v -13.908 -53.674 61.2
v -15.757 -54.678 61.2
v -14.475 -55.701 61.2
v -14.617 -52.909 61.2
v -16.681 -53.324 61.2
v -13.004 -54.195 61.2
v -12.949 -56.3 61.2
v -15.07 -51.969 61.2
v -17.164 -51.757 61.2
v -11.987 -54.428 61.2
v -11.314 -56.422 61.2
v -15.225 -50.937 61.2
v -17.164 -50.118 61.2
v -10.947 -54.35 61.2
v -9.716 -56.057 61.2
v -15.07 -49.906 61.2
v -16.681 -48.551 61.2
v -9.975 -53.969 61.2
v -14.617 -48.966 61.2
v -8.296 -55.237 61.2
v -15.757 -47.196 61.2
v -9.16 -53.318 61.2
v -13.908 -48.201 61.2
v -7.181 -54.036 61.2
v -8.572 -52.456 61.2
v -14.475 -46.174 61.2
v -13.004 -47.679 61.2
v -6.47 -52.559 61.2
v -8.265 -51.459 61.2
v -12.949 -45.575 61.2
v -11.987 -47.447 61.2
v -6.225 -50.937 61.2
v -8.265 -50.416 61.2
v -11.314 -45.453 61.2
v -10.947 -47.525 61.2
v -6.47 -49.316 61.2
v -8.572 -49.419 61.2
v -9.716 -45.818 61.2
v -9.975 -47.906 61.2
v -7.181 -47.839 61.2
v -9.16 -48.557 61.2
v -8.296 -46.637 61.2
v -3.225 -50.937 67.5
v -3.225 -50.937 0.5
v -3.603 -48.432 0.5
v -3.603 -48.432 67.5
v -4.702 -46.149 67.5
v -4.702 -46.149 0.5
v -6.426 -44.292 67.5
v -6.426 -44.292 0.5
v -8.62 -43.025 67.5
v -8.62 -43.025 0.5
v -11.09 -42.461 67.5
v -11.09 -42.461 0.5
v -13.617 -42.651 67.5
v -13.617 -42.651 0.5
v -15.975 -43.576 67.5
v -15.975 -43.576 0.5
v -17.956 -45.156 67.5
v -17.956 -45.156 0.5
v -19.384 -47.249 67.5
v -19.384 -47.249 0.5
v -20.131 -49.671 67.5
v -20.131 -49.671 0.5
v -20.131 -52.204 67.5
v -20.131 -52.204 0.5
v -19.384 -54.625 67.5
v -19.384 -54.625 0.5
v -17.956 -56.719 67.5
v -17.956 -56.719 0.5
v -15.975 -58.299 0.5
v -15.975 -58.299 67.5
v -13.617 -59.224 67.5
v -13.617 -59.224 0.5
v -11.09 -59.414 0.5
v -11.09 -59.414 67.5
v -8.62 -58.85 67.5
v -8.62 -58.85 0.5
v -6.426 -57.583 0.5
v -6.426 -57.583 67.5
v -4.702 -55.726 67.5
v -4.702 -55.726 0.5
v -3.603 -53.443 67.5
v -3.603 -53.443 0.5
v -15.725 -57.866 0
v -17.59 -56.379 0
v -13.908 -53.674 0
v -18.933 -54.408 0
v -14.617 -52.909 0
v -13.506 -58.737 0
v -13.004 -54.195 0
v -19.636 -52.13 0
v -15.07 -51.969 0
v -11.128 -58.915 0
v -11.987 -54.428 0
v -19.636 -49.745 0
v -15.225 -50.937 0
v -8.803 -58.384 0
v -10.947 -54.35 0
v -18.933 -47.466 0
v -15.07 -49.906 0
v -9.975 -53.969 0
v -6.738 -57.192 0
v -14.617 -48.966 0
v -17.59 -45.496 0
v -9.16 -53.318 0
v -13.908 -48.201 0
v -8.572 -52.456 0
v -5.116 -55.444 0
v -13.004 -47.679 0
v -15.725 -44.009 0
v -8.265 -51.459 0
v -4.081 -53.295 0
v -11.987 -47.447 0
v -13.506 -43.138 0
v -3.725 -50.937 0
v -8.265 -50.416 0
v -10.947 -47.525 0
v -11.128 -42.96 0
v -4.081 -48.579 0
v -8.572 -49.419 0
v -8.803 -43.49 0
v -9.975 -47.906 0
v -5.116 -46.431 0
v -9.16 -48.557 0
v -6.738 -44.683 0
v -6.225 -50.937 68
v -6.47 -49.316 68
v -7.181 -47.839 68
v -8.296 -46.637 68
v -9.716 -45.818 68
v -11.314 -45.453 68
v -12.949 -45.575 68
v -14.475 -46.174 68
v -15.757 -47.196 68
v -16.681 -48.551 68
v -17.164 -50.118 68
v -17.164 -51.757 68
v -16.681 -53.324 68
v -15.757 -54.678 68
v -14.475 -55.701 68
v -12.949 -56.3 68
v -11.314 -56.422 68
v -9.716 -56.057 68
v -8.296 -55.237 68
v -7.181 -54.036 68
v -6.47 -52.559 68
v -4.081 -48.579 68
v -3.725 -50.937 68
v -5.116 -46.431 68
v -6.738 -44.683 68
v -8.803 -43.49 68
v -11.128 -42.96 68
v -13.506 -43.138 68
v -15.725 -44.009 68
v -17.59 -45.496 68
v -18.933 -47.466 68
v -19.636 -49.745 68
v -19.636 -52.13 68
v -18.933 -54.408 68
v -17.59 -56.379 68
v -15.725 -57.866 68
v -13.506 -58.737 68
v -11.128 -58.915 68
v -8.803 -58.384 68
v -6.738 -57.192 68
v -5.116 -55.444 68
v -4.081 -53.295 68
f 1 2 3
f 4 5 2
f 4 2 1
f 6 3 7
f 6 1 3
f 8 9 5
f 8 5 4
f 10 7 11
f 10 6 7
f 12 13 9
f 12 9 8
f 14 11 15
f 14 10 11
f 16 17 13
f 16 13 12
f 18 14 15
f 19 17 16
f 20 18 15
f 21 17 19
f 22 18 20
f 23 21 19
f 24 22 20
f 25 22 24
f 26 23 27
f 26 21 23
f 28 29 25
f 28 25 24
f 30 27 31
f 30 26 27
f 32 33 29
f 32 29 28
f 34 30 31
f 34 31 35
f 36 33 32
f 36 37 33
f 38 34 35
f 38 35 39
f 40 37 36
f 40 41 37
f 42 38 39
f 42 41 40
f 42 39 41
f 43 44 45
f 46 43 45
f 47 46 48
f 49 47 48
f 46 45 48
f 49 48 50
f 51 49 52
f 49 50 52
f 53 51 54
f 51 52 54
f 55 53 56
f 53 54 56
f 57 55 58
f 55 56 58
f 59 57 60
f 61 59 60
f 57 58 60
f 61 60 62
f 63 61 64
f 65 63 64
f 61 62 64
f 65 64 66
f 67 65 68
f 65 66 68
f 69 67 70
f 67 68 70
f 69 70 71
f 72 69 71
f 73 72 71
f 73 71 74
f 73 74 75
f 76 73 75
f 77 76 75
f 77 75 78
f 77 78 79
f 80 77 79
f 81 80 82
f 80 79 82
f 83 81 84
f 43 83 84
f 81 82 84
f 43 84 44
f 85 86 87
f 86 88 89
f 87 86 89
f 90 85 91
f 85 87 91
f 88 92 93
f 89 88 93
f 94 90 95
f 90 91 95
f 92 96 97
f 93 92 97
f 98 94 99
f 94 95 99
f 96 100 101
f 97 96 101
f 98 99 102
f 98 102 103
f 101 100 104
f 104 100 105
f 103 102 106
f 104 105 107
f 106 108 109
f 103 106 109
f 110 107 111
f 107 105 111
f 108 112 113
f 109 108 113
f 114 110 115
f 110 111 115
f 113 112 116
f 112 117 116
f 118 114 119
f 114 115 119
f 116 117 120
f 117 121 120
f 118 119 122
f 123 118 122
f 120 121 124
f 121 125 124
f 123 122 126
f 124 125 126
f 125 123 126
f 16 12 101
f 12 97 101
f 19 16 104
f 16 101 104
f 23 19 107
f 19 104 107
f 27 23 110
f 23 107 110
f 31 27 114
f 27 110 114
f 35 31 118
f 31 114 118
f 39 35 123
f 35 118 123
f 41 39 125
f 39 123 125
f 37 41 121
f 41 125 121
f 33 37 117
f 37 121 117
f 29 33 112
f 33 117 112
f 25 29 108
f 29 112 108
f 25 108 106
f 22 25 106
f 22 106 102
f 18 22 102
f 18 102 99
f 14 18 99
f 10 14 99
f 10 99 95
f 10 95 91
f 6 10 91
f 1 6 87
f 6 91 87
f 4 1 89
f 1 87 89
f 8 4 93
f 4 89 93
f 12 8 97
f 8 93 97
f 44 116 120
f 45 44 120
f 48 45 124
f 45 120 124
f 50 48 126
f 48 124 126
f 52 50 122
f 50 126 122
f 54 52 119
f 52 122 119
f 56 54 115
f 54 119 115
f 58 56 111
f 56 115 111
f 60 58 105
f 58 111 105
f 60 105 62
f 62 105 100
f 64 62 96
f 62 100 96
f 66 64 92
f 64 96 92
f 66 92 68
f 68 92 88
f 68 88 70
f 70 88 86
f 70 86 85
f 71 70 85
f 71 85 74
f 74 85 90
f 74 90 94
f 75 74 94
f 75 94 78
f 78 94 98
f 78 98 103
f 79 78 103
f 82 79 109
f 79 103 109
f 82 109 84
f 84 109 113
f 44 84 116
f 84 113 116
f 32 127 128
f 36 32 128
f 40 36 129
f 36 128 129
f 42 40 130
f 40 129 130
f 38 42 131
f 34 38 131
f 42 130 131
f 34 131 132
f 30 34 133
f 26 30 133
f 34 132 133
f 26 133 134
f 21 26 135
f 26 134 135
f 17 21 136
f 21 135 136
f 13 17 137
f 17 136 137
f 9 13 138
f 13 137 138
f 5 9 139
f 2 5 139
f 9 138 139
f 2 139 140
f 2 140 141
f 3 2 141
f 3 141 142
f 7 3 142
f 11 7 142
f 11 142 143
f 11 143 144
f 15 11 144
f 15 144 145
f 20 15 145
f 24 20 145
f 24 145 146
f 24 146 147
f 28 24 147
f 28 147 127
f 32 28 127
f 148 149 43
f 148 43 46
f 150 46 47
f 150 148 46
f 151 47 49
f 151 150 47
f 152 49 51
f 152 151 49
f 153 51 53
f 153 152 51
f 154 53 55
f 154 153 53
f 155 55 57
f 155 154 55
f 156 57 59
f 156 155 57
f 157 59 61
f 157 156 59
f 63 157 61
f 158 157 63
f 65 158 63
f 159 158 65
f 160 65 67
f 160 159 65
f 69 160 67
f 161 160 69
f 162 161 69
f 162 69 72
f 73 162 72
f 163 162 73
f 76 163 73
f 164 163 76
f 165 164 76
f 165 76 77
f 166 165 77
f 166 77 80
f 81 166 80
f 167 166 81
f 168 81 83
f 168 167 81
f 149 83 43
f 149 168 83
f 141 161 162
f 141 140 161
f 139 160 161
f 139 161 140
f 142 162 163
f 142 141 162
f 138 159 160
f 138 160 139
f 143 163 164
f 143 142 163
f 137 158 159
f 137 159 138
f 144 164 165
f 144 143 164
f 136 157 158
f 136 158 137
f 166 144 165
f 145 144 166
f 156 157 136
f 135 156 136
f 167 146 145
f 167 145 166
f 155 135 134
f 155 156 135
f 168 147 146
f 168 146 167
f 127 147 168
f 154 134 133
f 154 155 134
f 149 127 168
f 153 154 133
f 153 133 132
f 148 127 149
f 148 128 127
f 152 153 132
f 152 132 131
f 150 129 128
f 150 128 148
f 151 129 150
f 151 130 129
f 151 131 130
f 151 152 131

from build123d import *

# Parameters (mm, degrees)
SKETCH_1_R                = 8.5
EXTRUDE_1_DEPTH           = 68
HOLE_WIZARD_1_D           = 7
HOLE_WIZARD_1_CBORE_D     = 11
HOLE_WIZARD_1_CBORE_DEPTH = 6.8
CHAMFER_1_SIZE            = 0.5


with BuildPart() as part:
    # 草图1 → 凸台-拉伸1 (new body)
    with BuildSketch(Plane.XY):
        with Locations((-11.725470696, -50.937423366)):
            Circle(SKETCH_1_R)
    extrude(amount=EXTRUDE_1_DEPTH)

    # 打孔尺寸(%根据)内六角圆柱头螺钉的类型1 (through all)
    with Locations(Plane.XY.offset(68)):
        with Locations((-11.725470696, -50.937423366)):
            CounterBoreHole(HOLE_WIZARD_1_D / 2, HOLE_WIZARD_1_CBORE_D / 2, HOLE_WIZARD_1_CBORE_DEPTH)

    # 倒角1
    chamfer_1_edges = [part.edges().sort_by_distance(p)[0] for p in [
        (-20.225470696, -50.937423366, 0),
        (-20.225470696, -50.937423366, 68),
    ]]
    chamfer(chamfer_1_edges, length=CHAMFER_1_SIZE)


solid = part.part
